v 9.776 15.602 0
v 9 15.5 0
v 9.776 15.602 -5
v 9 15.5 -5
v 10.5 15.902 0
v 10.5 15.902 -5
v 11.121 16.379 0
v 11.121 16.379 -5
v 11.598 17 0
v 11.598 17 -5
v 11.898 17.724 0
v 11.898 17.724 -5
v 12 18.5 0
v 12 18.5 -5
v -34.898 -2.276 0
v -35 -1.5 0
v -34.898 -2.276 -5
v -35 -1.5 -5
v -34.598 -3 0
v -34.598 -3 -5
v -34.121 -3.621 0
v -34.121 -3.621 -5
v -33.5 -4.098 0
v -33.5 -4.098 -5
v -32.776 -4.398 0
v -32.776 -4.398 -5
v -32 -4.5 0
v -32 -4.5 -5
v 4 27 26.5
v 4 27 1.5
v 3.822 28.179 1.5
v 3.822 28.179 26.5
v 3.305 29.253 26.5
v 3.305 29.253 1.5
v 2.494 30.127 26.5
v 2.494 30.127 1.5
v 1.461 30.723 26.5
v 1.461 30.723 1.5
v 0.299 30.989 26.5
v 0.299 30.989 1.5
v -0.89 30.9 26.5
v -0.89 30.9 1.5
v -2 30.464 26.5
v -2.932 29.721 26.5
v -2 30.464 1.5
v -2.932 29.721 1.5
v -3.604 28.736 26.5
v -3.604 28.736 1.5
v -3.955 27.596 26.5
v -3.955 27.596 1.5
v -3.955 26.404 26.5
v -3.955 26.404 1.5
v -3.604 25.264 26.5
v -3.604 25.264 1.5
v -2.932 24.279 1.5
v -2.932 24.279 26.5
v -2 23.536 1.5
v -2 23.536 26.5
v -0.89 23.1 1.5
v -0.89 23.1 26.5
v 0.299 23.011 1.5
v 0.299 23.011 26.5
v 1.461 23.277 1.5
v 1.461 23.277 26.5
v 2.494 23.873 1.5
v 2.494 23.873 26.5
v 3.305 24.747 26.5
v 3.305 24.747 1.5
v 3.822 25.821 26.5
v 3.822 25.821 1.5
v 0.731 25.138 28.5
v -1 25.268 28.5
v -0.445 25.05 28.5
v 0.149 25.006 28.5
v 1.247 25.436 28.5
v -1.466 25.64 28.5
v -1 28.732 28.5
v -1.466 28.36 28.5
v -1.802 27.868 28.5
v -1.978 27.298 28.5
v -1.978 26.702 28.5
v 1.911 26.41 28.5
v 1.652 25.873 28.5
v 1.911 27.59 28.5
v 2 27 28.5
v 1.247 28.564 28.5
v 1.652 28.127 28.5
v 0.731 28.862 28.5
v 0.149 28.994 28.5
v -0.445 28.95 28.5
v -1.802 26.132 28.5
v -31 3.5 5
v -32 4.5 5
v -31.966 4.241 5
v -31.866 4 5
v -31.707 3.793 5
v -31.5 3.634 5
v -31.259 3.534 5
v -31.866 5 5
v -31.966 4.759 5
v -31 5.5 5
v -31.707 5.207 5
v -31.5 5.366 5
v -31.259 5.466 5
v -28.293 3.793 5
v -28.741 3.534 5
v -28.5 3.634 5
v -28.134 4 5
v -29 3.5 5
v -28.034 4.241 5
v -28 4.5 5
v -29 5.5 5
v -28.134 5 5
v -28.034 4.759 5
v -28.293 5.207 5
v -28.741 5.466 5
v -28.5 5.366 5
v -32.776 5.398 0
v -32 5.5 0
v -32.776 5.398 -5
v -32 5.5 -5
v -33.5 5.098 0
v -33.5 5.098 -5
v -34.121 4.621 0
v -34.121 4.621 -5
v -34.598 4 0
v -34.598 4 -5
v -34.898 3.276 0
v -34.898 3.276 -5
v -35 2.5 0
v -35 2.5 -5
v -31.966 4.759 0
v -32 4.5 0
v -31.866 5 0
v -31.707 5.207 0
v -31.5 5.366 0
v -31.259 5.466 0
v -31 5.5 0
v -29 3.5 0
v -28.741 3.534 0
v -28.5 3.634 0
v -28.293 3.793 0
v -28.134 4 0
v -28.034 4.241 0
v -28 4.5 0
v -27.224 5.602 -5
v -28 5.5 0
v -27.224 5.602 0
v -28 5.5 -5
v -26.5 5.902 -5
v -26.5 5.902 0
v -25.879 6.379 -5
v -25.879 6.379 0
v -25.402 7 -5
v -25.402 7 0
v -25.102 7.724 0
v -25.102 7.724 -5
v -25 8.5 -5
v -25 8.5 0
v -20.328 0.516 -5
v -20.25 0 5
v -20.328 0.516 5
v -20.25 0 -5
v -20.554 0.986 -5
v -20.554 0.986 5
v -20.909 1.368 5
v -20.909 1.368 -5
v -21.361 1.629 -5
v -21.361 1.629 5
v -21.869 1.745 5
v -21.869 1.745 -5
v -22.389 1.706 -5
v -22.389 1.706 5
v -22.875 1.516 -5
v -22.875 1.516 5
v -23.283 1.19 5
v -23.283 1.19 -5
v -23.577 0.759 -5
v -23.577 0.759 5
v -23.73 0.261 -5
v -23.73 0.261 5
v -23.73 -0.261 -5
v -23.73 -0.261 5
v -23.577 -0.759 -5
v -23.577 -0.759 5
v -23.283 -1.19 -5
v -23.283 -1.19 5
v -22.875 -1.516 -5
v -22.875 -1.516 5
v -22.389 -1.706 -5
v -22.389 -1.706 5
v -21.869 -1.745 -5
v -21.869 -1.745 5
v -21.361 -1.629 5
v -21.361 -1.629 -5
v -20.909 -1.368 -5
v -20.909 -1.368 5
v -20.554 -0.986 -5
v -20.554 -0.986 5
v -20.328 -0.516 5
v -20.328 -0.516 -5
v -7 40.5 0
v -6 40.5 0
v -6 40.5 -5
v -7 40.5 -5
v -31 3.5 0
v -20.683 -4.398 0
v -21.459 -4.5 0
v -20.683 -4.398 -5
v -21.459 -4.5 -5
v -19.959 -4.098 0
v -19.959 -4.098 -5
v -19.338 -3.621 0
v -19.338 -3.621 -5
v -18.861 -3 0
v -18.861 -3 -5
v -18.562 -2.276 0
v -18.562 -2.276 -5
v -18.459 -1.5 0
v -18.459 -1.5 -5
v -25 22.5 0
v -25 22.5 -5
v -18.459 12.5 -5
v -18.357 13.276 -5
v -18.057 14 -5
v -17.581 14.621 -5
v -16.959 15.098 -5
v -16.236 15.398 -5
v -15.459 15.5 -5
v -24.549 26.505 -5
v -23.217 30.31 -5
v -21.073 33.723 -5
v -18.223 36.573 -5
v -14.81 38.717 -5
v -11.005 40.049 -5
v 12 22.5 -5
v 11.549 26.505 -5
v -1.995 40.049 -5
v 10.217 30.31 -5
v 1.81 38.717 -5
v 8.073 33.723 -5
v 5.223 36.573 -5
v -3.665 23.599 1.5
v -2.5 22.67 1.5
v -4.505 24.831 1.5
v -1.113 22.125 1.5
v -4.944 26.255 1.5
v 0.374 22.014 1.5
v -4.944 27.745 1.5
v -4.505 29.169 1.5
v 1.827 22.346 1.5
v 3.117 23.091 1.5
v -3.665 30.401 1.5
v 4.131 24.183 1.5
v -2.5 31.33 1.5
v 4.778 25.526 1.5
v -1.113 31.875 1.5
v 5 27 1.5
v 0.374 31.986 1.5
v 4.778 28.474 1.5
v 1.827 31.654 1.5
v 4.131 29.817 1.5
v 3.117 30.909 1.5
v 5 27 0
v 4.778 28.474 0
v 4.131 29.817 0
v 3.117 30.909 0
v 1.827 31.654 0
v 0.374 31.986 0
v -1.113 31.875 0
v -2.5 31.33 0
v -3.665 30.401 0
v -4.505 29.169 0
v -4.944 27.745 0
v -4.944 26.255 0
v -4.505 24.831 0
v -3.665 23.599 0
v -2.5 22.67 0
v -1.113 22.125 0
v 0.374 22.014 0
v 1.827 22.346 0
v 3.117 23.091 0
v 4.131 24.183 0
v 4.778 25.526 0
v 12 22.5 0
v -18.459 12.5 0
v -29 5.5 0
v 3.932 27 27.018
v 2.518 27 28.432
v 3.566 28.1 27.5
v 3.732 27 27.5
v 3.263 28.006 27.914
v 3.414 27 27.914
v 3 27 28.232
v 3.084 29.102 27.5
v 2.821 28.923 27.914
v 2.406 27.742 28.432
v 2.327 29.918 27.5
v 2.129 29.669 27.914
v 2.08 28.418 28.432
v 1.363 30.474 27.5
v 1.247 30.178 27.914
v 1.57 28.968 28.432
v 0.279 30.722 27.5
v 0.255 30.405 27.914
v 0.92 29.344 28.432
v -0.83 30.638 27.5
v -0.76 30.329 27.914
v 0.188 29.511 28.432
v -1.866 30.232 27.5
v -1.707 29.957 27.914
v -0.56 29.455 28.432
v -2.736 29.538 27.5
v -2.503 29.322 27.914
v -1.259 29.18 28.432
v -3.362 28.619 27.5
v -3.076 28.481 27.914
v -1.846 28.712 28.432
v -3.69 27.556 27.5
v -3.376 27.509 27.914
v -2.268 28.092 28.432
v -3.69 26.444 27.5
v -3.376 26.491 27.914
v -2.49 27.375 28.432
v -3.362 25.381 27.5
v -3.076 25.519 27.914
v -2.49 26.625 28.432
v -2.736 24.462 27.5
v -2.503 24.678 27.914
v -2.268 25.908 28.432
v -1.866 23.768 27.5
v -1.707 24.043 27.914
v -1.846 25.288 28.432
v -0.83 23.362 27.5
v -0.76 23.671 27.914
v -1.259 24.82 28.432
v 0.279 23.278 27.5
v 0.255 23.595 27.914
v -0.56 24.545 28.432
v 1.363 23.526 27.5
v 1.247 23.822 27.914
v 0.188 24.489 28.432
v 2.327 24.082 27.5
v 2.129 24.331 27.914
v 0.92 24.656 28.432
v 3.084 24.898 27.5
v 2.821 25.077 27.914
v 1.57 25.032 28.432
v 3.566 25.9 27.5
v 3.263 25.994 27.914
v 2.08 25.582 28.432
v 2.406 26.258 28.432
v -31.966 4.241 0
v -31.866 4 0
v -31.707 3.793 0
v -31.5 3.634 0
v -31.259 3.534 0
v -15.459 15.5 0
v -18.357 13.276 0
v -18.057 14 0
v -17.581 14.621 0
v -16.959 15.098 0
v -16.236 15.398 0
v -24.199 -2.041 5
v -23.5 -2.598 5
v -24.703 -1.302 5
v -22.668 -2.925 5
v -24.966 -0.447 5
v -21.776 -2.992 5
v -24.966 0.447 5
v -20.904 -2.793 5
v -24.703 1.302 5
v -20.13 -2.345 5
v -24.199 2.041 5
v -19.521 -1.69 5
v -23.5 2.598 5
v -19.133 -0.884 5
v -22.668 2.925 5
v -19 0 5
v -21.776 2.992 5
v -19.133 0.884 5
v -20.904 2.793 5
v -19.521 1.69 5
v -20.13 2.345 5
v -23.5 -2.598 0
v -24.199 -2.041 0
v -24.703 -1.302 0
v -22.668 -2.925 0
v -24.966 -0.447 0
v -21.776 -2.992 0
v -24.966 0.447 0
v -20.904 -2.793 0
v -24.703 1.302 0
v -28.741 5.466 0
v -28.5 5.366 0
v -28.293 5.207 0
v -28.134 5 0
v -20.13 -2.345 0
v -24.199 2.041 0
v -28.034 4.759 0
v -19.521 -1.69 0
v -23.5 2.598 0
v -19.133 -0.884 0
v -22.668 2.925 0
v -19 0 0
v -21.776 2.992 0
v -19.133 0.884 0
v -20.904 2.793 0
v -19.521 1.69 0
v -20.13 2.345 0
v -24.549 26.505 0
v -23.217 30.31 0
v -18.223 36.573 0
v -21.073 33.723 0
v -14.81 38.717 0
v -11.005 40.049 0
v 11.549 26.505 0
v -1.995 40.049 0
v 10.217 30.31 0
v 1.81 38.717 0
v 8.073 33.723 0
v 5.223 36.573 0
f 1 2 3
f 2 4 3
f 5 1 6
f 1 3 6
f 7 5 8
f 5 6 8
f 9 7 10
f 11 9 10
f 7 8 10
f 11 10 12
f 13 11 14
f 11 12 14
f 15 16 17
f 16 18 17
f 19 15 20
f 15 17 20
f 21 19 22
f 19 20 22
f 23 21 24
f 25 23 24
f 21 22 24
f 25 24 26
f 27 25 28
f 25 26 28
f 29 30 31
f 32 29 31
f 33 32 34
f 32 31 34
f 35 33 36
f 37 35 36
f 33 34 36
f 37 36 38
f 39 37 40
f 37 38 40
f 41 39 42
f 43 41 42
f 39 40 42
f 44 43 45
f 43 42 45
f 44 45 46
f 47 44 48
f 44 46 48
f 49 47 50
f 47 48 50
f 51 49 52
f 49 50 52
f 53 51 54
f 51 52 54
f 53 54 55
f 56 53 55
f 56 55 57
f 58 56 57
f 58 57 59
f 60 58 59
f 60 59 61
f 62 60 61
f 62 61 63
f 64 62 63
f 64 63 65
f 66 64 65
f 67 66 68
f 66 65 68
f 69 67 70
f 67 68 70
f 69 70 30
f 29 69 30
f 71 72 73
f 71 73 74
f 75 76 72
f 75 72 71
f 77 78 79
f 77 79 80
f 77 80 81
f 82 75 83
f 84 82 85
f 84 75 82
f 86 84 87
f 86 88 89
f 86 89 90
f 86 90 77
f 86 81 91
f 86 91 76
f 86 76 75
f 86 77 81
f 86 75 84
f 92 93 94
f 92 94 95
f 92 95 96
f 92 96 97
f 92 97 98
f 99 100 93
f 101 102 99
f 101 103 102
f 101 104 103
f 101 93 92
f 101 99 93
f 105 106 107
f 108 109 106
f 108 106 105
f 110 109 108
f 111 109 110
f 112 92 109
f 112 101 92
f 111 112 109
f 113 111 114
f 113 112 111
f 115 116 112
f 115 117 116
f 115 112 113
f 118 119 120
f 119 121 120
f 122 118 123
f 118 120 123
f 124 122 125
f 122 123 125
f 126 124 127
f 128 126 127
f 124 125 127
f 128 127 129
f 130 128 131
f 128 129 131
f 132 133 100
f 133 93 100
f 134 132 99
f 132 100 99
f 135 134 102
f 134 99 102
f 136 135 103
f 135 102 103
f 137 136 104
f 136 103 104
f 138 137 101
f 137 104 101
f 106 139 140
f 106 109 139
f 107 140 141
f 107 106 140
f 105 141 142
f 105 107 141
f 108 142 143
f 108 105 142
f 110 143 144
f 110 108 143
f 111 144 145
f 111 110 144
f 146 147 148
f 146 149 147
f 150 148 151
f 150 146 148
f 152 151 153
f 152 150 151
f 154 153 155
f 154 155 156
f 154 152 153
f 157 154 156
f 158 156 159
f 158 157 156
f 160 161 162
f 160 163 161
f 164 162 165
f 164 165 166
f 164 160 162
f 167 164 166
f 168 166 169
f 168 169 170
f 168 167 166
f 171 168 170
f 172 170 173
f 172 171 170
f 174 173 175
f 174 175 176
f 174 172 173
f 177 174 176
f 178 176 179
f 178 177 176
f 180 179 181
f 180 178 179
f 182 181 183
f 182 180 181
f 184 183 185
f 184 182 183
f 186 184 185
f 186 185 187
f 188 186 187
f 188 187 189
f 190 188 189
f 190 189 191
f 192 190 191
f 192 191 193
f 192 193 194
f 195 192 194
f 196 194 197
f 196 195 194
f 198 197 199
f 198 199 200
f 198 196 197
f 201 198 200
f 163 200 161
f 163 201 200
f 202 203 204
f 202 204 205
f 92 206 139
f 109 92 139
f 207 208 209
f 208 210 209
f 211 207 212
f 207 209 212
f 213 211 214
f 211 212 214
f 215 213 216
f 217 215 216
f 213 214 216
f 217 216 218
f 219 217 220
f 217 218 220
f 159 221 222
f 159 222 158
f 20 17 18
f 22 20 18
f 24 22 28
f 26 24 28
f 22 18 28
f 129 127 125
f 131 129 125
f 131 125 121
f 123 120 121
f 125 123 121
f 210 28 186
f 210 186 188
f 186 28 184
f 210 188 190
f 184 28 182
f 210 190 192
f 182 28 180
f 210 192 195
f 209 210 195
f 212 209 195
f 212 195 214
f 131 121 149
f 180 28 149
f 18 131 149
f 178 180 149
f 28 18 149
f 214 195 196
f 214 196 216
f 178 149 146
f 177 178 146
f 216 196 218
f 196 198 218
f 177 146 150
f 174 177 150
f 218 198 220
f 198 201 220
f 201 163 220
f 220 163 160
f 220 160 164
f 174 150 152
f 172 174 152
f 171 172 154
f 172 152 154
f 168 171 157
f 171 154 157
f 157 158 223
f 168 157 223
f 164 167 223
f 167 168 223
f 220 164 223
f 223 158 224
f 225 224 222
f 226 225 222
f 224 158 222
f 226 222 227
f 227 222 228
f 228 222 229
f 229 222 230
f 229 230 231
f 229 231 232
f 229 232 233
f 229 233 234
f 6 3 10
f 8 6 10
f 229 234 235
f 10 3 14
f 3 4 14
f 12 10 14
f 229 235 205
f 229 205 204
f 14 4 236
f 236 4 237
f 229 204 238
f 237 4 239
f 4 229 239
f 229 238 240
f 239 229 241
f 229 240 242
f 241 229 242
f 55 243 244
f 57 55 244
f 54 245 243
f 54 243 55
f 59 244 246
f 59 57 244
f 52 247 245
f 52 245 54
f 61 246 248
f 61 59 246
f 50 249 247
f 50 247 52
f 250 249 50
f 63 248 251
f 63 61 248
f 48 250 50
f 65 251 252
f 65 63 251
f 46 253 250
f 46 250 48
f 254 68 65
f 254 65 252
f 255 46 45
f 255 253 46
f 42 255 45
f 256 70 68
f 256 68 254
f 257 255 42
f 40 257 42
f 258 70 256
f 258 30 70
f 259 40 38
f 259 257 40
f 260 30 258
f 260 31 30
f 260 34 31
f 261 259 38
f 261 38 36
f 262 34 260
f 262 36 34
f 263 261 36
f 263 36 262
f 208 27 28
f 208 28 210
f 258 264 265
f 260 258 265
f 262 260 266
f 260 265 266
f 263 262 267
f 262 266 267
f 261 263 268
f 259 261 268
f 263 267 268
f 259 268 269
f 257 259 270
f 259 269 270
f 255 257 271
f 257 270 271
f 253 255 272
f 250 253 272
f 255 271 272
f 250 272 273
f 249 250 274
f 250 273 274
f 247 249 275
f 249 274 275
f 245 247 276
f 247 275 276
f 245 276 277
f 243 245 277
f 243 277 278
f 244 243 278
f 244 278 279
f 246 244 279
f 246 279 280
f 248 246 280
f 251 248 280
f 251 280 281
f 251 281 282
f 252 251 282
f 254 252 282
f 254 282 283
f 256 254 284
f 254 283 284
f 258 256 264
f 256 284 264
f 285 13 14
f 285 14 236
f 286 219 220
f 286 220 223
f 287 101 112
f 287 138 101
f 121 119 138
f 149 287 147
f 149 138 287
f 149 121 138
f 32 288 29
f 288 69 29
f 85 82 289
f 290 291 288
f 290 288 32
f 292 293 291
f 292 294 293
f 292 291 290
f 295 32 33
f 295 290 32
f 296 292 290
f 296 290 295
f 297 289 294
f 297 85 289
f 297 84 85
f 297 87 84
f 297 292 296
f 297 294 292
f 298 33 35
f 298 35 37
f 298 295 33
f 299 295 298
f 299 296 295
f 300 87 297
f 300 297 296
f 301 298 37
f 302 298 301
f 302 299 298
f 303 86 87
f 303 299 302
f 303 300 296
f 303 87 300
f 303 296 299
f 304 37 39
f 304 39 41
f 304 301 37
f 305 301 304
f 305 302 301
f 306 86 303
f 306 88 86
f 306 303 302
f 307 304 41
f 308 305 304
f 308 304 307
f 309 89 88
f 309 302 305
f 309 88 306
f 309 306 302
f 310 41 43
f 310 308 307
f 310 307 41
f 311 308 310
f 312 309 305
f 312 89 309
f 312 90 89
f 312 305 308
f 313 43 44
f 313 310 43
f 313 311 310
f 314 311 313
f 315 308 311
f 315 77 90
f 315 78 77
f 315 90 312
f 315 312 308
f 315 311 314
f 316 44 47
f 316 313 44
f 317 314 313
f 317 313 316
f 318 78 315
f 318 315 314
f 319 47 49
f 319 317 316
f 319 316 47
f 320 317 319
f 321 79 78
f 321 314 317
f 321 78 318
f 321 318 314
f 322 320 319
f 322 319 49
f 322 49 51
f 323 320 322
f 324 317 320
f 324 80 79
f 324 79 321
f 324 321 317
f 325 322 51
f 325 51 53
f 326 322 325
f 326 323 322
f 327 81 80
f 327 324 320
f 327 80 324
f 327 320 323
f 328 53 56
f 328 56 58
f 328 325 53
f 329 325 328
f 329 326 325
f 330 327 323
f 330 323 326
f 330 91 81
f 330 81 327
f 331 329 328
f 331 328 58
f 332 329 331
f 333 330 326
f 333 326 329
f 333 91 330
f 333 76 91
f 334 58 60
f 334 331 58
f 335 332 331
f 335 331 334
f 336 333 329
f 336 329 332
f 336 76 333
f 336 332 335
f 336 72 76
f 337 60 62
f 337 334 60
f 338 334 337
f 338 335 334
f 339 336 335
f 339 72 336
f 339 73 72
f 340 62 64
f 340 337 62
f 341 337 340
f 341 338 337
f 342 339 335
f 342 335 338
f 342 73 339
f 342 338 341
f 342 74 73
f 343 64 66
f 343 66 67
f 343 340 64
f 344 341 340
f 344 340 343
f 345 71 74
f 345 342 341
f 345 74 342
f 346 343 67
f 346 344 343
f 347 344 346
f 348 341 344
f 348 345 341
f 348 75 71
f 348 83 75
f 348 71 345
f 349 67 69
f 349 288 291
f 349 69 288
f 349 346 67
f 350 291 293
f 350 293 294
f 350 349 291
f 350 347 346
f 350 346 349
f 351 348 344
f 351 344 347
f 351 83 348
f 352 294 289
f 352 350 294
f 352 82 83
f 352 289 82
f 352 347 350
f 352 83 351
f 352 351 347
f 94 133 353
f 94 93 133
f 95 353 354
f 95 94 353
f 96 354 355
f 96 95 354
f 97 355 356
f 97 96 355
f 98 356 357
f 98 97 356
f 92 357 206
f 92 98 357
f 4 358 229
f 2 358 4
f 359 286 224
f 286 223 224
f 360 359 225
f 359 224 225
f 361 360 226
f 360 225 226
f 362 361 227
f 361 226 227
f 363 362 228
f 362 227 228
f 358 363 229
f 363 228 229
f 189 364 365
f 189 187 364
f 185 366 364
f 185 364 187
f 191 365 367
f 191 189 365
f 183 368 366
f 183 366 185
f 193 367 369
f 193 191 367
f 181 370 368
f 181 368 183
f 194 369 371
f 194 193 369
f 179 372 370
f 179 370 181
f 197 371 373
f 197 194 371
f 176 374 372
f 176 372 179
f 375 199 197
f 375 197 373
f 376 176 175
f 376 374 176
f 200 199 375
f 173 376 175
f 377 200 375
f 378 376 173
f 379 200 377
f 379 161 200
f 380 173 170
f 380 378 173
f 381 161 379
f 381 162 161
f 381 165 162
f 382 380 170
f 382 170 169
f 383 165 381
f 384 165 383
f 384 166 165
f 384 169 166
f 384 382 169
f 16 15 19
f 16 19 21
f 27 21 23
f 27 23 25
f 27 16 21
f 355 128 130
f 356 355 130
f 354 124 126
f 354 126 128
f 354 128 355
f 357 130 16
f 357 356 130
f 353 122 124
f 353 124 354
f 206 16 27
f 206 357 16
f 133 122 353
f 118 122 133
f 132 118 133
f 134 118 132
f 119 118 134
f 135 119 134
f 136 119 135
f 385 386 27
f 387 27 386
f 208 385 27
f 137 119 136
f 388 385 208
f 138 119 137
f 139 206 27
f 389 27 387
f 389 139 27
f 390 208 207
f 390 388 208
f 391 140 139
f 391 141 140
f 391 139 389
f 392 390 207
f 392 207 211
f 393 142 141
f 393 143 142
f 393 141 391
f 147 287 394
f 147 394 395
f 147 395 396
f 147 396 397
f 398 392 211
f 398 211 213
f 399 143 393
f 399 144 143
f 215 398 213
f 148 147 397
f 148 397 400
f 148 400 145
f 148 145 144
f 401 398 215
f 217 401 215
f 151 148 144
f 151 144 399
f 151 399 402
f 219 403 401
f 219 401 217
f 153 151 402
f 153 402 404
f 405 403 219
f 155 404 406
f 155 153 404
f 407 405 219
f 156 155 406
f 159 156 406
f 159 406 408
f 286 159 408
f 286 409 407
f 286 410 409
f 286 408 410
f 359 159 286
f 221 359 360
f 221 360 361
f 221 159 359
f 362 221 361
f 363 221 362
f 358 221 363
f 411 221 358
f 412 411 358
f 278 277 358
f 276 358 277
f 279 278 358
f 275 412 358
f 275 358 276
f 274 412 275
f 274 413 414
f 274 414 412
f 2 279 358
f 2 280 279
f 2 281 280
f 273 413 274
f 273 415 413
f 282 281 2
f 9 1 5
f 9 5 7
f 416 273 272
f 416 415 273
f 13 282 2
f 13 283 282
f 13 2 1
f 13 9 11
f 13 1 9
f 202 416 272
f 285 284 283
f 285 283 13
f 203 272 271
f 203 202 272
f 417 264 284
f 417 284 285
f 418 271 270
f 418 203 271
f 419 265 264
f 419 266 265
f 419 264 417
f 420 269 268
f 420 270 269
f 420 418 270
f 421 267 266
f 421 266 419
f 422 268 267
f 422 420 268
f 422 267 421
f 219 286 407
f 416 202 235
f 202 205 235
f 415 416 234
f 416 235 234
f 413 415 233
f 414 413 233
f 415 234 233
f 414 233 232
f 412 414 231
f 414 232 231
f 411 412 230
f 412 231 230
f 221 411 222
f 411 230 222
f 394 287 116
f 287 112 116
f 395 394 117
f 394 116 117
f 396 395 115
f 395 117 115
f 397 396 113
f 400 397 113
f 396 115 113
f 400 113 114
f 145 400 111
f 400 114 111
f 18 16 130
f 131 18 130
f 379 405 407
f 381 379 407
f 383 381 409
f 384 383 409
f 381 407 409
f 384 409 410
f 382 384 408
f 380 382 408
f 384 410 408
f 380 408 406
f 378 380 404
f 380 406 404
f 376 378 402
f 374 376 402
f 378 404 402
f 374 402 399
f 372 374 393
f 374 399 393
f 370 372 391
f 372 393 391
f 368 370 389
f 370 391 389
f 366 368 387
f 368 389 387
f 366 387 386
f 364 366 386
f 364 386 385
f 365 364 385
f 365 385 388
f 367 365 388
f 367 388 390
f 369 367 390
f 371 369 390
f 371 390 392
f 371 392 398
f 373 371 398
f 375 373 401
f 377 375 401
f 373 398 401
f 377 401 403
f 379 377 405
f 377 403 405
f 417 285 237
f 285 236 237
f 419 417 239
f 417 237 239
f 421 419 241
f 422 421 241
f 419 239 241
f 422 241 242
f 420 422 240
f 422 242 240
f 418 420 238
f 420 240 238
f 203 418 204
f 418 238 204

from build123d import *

# Parameters (mm, degrees)
F0_R      = 5
F0_R_2    = 1.75
F0_W      = 10
F0_H      = 10
F0_R_3    = 4
F1_DEPTH  = 5
F2_DEPTH  = 1.5
F3_R      = 4
F4_DEPTH  = 27
F5_R      = 2
F6_R      = 18
F7_R      = 3
F7_R_2    = 1.75
F8_DEPTH  = 5
F9_R      = 3
F10_W     = 4
F10_H     = 2
F11_DEPTH = 5
F12_R     = 0.99999


# Not quite as in the source:
# - a fillet or chamfer is up to 0.001 mm smaller than in the source, because OpenCascade refuses the exact size


with BuildPart() as f1:
    # F0 (on Top) → F1 (new body)
    with BuildSketch(Plane.XY):
        Polygon((-25, 15.5), (-18.459414942, 15.5), (12, 15.5), (12, 40.5), (-25, 40.5), align=None)
        with Locations((0, 27)):
            Circle(F0_R, mode=Mode.SUBTRACT)
        Polygon((-25, 5.5), (-25, -4.5), (-18.459414942, -4.5), (-18.459414942, 15.5), (-25, 15.5), align=None)
        with Locations((-22, 0)):
            Circle(F0_R_2, mode=Mode.SUBTRACT)
        with Locations((-30, 0.5)):
            Rectangle(F0_W, F0_H)
        with Locations((0, 27)):
            Circle(F0_R)
        with Locations((0, 27)):
            Circle(F0_R_3, mode=Mode.SUBTRACT)
        with Locations((0, 27)):
            Circle(F0_R_3)
    extrude(amount=-F1_DEPTH)

    # F0 (on Top) → F2 (join)
    with BuildSketch(Plane.XY):
        with Locations((0, 27)):
            Circle(F0_R)
        with Locations((0, 27)):
            Circle(F0_R_3, mode=Mode.SUBTRACT)
        with Locations((0, 27)):
            Circle(F0_R_3)
    extrude(amount=F2_DEPTH)

    # F3 (on face) → F4 (join)
    with BuildSketch(Plane.XY.offset(1.5)):
        with Locations((0, 27)):
            Circle(F3_R)
    extrude(amount=F4_DEPTH)

    # F5
    f5_edges = [f1.edges().sort_by_distance(p)[0] for p in [
        (-4, 27, 28.5),
    ]]
    fillet(f5_edges, radius=F5_R)

    # F6
    f6_edges = [f1.edges().sort_by_distance(p)[0] for p in [
        (-25, 40.5, -2.5),
        (12, 40.5, -2.5),
    ]]
    fillet(f6_edges, radius=F6_R)

    # F7 (on face) → F8 (join)
    with BuildSketch(Plane.XY):
        with Locations((-22, 0)):
            Circle(F7_R)
        with Locations((-22, 0)):
            Circle(F7_R_2, mode=Mode.SUBTRACT)
    extrude(amount=F8_DEPTH)

    # F9
    f9_edges = [f1.edges().sort_by_distance(p)[0] for p in [
        (-25, 5.5, -2.5),
        (-35, 5.5, -2.5),
        (-35, -4.5, -2.5),
        (-18.459415, -4.5, -2.5),
        (-18.459415, 15.5, -2.5),
        (12, 15.5, -2.5),
    ]]
    fillet(f9_edges, radius=F9_R)

    # F10 (on face) → F11 (join)
    with BuildSketch(Plane.XY):
        with Locations((-30, 4.5)):
            Rectangle(F10_W, F10_H)
    extrude(amount=F11_DEPTH)

    # F12 (radius 1 in the source; OpenCascade refuses exactly that, so slightly less here)
    f12_edges = [f1.edges().sort_by_distance(p)[0] for p in [
        (-32, 5.5, 2.5),
        (-32, 3.5, 2.5),
        (-28, 3.5, 2.5),
        (-28, 5.5, 2.5),
    ]]
    fillet(f12_edges, radius=F12_R)


solid = f1.part
